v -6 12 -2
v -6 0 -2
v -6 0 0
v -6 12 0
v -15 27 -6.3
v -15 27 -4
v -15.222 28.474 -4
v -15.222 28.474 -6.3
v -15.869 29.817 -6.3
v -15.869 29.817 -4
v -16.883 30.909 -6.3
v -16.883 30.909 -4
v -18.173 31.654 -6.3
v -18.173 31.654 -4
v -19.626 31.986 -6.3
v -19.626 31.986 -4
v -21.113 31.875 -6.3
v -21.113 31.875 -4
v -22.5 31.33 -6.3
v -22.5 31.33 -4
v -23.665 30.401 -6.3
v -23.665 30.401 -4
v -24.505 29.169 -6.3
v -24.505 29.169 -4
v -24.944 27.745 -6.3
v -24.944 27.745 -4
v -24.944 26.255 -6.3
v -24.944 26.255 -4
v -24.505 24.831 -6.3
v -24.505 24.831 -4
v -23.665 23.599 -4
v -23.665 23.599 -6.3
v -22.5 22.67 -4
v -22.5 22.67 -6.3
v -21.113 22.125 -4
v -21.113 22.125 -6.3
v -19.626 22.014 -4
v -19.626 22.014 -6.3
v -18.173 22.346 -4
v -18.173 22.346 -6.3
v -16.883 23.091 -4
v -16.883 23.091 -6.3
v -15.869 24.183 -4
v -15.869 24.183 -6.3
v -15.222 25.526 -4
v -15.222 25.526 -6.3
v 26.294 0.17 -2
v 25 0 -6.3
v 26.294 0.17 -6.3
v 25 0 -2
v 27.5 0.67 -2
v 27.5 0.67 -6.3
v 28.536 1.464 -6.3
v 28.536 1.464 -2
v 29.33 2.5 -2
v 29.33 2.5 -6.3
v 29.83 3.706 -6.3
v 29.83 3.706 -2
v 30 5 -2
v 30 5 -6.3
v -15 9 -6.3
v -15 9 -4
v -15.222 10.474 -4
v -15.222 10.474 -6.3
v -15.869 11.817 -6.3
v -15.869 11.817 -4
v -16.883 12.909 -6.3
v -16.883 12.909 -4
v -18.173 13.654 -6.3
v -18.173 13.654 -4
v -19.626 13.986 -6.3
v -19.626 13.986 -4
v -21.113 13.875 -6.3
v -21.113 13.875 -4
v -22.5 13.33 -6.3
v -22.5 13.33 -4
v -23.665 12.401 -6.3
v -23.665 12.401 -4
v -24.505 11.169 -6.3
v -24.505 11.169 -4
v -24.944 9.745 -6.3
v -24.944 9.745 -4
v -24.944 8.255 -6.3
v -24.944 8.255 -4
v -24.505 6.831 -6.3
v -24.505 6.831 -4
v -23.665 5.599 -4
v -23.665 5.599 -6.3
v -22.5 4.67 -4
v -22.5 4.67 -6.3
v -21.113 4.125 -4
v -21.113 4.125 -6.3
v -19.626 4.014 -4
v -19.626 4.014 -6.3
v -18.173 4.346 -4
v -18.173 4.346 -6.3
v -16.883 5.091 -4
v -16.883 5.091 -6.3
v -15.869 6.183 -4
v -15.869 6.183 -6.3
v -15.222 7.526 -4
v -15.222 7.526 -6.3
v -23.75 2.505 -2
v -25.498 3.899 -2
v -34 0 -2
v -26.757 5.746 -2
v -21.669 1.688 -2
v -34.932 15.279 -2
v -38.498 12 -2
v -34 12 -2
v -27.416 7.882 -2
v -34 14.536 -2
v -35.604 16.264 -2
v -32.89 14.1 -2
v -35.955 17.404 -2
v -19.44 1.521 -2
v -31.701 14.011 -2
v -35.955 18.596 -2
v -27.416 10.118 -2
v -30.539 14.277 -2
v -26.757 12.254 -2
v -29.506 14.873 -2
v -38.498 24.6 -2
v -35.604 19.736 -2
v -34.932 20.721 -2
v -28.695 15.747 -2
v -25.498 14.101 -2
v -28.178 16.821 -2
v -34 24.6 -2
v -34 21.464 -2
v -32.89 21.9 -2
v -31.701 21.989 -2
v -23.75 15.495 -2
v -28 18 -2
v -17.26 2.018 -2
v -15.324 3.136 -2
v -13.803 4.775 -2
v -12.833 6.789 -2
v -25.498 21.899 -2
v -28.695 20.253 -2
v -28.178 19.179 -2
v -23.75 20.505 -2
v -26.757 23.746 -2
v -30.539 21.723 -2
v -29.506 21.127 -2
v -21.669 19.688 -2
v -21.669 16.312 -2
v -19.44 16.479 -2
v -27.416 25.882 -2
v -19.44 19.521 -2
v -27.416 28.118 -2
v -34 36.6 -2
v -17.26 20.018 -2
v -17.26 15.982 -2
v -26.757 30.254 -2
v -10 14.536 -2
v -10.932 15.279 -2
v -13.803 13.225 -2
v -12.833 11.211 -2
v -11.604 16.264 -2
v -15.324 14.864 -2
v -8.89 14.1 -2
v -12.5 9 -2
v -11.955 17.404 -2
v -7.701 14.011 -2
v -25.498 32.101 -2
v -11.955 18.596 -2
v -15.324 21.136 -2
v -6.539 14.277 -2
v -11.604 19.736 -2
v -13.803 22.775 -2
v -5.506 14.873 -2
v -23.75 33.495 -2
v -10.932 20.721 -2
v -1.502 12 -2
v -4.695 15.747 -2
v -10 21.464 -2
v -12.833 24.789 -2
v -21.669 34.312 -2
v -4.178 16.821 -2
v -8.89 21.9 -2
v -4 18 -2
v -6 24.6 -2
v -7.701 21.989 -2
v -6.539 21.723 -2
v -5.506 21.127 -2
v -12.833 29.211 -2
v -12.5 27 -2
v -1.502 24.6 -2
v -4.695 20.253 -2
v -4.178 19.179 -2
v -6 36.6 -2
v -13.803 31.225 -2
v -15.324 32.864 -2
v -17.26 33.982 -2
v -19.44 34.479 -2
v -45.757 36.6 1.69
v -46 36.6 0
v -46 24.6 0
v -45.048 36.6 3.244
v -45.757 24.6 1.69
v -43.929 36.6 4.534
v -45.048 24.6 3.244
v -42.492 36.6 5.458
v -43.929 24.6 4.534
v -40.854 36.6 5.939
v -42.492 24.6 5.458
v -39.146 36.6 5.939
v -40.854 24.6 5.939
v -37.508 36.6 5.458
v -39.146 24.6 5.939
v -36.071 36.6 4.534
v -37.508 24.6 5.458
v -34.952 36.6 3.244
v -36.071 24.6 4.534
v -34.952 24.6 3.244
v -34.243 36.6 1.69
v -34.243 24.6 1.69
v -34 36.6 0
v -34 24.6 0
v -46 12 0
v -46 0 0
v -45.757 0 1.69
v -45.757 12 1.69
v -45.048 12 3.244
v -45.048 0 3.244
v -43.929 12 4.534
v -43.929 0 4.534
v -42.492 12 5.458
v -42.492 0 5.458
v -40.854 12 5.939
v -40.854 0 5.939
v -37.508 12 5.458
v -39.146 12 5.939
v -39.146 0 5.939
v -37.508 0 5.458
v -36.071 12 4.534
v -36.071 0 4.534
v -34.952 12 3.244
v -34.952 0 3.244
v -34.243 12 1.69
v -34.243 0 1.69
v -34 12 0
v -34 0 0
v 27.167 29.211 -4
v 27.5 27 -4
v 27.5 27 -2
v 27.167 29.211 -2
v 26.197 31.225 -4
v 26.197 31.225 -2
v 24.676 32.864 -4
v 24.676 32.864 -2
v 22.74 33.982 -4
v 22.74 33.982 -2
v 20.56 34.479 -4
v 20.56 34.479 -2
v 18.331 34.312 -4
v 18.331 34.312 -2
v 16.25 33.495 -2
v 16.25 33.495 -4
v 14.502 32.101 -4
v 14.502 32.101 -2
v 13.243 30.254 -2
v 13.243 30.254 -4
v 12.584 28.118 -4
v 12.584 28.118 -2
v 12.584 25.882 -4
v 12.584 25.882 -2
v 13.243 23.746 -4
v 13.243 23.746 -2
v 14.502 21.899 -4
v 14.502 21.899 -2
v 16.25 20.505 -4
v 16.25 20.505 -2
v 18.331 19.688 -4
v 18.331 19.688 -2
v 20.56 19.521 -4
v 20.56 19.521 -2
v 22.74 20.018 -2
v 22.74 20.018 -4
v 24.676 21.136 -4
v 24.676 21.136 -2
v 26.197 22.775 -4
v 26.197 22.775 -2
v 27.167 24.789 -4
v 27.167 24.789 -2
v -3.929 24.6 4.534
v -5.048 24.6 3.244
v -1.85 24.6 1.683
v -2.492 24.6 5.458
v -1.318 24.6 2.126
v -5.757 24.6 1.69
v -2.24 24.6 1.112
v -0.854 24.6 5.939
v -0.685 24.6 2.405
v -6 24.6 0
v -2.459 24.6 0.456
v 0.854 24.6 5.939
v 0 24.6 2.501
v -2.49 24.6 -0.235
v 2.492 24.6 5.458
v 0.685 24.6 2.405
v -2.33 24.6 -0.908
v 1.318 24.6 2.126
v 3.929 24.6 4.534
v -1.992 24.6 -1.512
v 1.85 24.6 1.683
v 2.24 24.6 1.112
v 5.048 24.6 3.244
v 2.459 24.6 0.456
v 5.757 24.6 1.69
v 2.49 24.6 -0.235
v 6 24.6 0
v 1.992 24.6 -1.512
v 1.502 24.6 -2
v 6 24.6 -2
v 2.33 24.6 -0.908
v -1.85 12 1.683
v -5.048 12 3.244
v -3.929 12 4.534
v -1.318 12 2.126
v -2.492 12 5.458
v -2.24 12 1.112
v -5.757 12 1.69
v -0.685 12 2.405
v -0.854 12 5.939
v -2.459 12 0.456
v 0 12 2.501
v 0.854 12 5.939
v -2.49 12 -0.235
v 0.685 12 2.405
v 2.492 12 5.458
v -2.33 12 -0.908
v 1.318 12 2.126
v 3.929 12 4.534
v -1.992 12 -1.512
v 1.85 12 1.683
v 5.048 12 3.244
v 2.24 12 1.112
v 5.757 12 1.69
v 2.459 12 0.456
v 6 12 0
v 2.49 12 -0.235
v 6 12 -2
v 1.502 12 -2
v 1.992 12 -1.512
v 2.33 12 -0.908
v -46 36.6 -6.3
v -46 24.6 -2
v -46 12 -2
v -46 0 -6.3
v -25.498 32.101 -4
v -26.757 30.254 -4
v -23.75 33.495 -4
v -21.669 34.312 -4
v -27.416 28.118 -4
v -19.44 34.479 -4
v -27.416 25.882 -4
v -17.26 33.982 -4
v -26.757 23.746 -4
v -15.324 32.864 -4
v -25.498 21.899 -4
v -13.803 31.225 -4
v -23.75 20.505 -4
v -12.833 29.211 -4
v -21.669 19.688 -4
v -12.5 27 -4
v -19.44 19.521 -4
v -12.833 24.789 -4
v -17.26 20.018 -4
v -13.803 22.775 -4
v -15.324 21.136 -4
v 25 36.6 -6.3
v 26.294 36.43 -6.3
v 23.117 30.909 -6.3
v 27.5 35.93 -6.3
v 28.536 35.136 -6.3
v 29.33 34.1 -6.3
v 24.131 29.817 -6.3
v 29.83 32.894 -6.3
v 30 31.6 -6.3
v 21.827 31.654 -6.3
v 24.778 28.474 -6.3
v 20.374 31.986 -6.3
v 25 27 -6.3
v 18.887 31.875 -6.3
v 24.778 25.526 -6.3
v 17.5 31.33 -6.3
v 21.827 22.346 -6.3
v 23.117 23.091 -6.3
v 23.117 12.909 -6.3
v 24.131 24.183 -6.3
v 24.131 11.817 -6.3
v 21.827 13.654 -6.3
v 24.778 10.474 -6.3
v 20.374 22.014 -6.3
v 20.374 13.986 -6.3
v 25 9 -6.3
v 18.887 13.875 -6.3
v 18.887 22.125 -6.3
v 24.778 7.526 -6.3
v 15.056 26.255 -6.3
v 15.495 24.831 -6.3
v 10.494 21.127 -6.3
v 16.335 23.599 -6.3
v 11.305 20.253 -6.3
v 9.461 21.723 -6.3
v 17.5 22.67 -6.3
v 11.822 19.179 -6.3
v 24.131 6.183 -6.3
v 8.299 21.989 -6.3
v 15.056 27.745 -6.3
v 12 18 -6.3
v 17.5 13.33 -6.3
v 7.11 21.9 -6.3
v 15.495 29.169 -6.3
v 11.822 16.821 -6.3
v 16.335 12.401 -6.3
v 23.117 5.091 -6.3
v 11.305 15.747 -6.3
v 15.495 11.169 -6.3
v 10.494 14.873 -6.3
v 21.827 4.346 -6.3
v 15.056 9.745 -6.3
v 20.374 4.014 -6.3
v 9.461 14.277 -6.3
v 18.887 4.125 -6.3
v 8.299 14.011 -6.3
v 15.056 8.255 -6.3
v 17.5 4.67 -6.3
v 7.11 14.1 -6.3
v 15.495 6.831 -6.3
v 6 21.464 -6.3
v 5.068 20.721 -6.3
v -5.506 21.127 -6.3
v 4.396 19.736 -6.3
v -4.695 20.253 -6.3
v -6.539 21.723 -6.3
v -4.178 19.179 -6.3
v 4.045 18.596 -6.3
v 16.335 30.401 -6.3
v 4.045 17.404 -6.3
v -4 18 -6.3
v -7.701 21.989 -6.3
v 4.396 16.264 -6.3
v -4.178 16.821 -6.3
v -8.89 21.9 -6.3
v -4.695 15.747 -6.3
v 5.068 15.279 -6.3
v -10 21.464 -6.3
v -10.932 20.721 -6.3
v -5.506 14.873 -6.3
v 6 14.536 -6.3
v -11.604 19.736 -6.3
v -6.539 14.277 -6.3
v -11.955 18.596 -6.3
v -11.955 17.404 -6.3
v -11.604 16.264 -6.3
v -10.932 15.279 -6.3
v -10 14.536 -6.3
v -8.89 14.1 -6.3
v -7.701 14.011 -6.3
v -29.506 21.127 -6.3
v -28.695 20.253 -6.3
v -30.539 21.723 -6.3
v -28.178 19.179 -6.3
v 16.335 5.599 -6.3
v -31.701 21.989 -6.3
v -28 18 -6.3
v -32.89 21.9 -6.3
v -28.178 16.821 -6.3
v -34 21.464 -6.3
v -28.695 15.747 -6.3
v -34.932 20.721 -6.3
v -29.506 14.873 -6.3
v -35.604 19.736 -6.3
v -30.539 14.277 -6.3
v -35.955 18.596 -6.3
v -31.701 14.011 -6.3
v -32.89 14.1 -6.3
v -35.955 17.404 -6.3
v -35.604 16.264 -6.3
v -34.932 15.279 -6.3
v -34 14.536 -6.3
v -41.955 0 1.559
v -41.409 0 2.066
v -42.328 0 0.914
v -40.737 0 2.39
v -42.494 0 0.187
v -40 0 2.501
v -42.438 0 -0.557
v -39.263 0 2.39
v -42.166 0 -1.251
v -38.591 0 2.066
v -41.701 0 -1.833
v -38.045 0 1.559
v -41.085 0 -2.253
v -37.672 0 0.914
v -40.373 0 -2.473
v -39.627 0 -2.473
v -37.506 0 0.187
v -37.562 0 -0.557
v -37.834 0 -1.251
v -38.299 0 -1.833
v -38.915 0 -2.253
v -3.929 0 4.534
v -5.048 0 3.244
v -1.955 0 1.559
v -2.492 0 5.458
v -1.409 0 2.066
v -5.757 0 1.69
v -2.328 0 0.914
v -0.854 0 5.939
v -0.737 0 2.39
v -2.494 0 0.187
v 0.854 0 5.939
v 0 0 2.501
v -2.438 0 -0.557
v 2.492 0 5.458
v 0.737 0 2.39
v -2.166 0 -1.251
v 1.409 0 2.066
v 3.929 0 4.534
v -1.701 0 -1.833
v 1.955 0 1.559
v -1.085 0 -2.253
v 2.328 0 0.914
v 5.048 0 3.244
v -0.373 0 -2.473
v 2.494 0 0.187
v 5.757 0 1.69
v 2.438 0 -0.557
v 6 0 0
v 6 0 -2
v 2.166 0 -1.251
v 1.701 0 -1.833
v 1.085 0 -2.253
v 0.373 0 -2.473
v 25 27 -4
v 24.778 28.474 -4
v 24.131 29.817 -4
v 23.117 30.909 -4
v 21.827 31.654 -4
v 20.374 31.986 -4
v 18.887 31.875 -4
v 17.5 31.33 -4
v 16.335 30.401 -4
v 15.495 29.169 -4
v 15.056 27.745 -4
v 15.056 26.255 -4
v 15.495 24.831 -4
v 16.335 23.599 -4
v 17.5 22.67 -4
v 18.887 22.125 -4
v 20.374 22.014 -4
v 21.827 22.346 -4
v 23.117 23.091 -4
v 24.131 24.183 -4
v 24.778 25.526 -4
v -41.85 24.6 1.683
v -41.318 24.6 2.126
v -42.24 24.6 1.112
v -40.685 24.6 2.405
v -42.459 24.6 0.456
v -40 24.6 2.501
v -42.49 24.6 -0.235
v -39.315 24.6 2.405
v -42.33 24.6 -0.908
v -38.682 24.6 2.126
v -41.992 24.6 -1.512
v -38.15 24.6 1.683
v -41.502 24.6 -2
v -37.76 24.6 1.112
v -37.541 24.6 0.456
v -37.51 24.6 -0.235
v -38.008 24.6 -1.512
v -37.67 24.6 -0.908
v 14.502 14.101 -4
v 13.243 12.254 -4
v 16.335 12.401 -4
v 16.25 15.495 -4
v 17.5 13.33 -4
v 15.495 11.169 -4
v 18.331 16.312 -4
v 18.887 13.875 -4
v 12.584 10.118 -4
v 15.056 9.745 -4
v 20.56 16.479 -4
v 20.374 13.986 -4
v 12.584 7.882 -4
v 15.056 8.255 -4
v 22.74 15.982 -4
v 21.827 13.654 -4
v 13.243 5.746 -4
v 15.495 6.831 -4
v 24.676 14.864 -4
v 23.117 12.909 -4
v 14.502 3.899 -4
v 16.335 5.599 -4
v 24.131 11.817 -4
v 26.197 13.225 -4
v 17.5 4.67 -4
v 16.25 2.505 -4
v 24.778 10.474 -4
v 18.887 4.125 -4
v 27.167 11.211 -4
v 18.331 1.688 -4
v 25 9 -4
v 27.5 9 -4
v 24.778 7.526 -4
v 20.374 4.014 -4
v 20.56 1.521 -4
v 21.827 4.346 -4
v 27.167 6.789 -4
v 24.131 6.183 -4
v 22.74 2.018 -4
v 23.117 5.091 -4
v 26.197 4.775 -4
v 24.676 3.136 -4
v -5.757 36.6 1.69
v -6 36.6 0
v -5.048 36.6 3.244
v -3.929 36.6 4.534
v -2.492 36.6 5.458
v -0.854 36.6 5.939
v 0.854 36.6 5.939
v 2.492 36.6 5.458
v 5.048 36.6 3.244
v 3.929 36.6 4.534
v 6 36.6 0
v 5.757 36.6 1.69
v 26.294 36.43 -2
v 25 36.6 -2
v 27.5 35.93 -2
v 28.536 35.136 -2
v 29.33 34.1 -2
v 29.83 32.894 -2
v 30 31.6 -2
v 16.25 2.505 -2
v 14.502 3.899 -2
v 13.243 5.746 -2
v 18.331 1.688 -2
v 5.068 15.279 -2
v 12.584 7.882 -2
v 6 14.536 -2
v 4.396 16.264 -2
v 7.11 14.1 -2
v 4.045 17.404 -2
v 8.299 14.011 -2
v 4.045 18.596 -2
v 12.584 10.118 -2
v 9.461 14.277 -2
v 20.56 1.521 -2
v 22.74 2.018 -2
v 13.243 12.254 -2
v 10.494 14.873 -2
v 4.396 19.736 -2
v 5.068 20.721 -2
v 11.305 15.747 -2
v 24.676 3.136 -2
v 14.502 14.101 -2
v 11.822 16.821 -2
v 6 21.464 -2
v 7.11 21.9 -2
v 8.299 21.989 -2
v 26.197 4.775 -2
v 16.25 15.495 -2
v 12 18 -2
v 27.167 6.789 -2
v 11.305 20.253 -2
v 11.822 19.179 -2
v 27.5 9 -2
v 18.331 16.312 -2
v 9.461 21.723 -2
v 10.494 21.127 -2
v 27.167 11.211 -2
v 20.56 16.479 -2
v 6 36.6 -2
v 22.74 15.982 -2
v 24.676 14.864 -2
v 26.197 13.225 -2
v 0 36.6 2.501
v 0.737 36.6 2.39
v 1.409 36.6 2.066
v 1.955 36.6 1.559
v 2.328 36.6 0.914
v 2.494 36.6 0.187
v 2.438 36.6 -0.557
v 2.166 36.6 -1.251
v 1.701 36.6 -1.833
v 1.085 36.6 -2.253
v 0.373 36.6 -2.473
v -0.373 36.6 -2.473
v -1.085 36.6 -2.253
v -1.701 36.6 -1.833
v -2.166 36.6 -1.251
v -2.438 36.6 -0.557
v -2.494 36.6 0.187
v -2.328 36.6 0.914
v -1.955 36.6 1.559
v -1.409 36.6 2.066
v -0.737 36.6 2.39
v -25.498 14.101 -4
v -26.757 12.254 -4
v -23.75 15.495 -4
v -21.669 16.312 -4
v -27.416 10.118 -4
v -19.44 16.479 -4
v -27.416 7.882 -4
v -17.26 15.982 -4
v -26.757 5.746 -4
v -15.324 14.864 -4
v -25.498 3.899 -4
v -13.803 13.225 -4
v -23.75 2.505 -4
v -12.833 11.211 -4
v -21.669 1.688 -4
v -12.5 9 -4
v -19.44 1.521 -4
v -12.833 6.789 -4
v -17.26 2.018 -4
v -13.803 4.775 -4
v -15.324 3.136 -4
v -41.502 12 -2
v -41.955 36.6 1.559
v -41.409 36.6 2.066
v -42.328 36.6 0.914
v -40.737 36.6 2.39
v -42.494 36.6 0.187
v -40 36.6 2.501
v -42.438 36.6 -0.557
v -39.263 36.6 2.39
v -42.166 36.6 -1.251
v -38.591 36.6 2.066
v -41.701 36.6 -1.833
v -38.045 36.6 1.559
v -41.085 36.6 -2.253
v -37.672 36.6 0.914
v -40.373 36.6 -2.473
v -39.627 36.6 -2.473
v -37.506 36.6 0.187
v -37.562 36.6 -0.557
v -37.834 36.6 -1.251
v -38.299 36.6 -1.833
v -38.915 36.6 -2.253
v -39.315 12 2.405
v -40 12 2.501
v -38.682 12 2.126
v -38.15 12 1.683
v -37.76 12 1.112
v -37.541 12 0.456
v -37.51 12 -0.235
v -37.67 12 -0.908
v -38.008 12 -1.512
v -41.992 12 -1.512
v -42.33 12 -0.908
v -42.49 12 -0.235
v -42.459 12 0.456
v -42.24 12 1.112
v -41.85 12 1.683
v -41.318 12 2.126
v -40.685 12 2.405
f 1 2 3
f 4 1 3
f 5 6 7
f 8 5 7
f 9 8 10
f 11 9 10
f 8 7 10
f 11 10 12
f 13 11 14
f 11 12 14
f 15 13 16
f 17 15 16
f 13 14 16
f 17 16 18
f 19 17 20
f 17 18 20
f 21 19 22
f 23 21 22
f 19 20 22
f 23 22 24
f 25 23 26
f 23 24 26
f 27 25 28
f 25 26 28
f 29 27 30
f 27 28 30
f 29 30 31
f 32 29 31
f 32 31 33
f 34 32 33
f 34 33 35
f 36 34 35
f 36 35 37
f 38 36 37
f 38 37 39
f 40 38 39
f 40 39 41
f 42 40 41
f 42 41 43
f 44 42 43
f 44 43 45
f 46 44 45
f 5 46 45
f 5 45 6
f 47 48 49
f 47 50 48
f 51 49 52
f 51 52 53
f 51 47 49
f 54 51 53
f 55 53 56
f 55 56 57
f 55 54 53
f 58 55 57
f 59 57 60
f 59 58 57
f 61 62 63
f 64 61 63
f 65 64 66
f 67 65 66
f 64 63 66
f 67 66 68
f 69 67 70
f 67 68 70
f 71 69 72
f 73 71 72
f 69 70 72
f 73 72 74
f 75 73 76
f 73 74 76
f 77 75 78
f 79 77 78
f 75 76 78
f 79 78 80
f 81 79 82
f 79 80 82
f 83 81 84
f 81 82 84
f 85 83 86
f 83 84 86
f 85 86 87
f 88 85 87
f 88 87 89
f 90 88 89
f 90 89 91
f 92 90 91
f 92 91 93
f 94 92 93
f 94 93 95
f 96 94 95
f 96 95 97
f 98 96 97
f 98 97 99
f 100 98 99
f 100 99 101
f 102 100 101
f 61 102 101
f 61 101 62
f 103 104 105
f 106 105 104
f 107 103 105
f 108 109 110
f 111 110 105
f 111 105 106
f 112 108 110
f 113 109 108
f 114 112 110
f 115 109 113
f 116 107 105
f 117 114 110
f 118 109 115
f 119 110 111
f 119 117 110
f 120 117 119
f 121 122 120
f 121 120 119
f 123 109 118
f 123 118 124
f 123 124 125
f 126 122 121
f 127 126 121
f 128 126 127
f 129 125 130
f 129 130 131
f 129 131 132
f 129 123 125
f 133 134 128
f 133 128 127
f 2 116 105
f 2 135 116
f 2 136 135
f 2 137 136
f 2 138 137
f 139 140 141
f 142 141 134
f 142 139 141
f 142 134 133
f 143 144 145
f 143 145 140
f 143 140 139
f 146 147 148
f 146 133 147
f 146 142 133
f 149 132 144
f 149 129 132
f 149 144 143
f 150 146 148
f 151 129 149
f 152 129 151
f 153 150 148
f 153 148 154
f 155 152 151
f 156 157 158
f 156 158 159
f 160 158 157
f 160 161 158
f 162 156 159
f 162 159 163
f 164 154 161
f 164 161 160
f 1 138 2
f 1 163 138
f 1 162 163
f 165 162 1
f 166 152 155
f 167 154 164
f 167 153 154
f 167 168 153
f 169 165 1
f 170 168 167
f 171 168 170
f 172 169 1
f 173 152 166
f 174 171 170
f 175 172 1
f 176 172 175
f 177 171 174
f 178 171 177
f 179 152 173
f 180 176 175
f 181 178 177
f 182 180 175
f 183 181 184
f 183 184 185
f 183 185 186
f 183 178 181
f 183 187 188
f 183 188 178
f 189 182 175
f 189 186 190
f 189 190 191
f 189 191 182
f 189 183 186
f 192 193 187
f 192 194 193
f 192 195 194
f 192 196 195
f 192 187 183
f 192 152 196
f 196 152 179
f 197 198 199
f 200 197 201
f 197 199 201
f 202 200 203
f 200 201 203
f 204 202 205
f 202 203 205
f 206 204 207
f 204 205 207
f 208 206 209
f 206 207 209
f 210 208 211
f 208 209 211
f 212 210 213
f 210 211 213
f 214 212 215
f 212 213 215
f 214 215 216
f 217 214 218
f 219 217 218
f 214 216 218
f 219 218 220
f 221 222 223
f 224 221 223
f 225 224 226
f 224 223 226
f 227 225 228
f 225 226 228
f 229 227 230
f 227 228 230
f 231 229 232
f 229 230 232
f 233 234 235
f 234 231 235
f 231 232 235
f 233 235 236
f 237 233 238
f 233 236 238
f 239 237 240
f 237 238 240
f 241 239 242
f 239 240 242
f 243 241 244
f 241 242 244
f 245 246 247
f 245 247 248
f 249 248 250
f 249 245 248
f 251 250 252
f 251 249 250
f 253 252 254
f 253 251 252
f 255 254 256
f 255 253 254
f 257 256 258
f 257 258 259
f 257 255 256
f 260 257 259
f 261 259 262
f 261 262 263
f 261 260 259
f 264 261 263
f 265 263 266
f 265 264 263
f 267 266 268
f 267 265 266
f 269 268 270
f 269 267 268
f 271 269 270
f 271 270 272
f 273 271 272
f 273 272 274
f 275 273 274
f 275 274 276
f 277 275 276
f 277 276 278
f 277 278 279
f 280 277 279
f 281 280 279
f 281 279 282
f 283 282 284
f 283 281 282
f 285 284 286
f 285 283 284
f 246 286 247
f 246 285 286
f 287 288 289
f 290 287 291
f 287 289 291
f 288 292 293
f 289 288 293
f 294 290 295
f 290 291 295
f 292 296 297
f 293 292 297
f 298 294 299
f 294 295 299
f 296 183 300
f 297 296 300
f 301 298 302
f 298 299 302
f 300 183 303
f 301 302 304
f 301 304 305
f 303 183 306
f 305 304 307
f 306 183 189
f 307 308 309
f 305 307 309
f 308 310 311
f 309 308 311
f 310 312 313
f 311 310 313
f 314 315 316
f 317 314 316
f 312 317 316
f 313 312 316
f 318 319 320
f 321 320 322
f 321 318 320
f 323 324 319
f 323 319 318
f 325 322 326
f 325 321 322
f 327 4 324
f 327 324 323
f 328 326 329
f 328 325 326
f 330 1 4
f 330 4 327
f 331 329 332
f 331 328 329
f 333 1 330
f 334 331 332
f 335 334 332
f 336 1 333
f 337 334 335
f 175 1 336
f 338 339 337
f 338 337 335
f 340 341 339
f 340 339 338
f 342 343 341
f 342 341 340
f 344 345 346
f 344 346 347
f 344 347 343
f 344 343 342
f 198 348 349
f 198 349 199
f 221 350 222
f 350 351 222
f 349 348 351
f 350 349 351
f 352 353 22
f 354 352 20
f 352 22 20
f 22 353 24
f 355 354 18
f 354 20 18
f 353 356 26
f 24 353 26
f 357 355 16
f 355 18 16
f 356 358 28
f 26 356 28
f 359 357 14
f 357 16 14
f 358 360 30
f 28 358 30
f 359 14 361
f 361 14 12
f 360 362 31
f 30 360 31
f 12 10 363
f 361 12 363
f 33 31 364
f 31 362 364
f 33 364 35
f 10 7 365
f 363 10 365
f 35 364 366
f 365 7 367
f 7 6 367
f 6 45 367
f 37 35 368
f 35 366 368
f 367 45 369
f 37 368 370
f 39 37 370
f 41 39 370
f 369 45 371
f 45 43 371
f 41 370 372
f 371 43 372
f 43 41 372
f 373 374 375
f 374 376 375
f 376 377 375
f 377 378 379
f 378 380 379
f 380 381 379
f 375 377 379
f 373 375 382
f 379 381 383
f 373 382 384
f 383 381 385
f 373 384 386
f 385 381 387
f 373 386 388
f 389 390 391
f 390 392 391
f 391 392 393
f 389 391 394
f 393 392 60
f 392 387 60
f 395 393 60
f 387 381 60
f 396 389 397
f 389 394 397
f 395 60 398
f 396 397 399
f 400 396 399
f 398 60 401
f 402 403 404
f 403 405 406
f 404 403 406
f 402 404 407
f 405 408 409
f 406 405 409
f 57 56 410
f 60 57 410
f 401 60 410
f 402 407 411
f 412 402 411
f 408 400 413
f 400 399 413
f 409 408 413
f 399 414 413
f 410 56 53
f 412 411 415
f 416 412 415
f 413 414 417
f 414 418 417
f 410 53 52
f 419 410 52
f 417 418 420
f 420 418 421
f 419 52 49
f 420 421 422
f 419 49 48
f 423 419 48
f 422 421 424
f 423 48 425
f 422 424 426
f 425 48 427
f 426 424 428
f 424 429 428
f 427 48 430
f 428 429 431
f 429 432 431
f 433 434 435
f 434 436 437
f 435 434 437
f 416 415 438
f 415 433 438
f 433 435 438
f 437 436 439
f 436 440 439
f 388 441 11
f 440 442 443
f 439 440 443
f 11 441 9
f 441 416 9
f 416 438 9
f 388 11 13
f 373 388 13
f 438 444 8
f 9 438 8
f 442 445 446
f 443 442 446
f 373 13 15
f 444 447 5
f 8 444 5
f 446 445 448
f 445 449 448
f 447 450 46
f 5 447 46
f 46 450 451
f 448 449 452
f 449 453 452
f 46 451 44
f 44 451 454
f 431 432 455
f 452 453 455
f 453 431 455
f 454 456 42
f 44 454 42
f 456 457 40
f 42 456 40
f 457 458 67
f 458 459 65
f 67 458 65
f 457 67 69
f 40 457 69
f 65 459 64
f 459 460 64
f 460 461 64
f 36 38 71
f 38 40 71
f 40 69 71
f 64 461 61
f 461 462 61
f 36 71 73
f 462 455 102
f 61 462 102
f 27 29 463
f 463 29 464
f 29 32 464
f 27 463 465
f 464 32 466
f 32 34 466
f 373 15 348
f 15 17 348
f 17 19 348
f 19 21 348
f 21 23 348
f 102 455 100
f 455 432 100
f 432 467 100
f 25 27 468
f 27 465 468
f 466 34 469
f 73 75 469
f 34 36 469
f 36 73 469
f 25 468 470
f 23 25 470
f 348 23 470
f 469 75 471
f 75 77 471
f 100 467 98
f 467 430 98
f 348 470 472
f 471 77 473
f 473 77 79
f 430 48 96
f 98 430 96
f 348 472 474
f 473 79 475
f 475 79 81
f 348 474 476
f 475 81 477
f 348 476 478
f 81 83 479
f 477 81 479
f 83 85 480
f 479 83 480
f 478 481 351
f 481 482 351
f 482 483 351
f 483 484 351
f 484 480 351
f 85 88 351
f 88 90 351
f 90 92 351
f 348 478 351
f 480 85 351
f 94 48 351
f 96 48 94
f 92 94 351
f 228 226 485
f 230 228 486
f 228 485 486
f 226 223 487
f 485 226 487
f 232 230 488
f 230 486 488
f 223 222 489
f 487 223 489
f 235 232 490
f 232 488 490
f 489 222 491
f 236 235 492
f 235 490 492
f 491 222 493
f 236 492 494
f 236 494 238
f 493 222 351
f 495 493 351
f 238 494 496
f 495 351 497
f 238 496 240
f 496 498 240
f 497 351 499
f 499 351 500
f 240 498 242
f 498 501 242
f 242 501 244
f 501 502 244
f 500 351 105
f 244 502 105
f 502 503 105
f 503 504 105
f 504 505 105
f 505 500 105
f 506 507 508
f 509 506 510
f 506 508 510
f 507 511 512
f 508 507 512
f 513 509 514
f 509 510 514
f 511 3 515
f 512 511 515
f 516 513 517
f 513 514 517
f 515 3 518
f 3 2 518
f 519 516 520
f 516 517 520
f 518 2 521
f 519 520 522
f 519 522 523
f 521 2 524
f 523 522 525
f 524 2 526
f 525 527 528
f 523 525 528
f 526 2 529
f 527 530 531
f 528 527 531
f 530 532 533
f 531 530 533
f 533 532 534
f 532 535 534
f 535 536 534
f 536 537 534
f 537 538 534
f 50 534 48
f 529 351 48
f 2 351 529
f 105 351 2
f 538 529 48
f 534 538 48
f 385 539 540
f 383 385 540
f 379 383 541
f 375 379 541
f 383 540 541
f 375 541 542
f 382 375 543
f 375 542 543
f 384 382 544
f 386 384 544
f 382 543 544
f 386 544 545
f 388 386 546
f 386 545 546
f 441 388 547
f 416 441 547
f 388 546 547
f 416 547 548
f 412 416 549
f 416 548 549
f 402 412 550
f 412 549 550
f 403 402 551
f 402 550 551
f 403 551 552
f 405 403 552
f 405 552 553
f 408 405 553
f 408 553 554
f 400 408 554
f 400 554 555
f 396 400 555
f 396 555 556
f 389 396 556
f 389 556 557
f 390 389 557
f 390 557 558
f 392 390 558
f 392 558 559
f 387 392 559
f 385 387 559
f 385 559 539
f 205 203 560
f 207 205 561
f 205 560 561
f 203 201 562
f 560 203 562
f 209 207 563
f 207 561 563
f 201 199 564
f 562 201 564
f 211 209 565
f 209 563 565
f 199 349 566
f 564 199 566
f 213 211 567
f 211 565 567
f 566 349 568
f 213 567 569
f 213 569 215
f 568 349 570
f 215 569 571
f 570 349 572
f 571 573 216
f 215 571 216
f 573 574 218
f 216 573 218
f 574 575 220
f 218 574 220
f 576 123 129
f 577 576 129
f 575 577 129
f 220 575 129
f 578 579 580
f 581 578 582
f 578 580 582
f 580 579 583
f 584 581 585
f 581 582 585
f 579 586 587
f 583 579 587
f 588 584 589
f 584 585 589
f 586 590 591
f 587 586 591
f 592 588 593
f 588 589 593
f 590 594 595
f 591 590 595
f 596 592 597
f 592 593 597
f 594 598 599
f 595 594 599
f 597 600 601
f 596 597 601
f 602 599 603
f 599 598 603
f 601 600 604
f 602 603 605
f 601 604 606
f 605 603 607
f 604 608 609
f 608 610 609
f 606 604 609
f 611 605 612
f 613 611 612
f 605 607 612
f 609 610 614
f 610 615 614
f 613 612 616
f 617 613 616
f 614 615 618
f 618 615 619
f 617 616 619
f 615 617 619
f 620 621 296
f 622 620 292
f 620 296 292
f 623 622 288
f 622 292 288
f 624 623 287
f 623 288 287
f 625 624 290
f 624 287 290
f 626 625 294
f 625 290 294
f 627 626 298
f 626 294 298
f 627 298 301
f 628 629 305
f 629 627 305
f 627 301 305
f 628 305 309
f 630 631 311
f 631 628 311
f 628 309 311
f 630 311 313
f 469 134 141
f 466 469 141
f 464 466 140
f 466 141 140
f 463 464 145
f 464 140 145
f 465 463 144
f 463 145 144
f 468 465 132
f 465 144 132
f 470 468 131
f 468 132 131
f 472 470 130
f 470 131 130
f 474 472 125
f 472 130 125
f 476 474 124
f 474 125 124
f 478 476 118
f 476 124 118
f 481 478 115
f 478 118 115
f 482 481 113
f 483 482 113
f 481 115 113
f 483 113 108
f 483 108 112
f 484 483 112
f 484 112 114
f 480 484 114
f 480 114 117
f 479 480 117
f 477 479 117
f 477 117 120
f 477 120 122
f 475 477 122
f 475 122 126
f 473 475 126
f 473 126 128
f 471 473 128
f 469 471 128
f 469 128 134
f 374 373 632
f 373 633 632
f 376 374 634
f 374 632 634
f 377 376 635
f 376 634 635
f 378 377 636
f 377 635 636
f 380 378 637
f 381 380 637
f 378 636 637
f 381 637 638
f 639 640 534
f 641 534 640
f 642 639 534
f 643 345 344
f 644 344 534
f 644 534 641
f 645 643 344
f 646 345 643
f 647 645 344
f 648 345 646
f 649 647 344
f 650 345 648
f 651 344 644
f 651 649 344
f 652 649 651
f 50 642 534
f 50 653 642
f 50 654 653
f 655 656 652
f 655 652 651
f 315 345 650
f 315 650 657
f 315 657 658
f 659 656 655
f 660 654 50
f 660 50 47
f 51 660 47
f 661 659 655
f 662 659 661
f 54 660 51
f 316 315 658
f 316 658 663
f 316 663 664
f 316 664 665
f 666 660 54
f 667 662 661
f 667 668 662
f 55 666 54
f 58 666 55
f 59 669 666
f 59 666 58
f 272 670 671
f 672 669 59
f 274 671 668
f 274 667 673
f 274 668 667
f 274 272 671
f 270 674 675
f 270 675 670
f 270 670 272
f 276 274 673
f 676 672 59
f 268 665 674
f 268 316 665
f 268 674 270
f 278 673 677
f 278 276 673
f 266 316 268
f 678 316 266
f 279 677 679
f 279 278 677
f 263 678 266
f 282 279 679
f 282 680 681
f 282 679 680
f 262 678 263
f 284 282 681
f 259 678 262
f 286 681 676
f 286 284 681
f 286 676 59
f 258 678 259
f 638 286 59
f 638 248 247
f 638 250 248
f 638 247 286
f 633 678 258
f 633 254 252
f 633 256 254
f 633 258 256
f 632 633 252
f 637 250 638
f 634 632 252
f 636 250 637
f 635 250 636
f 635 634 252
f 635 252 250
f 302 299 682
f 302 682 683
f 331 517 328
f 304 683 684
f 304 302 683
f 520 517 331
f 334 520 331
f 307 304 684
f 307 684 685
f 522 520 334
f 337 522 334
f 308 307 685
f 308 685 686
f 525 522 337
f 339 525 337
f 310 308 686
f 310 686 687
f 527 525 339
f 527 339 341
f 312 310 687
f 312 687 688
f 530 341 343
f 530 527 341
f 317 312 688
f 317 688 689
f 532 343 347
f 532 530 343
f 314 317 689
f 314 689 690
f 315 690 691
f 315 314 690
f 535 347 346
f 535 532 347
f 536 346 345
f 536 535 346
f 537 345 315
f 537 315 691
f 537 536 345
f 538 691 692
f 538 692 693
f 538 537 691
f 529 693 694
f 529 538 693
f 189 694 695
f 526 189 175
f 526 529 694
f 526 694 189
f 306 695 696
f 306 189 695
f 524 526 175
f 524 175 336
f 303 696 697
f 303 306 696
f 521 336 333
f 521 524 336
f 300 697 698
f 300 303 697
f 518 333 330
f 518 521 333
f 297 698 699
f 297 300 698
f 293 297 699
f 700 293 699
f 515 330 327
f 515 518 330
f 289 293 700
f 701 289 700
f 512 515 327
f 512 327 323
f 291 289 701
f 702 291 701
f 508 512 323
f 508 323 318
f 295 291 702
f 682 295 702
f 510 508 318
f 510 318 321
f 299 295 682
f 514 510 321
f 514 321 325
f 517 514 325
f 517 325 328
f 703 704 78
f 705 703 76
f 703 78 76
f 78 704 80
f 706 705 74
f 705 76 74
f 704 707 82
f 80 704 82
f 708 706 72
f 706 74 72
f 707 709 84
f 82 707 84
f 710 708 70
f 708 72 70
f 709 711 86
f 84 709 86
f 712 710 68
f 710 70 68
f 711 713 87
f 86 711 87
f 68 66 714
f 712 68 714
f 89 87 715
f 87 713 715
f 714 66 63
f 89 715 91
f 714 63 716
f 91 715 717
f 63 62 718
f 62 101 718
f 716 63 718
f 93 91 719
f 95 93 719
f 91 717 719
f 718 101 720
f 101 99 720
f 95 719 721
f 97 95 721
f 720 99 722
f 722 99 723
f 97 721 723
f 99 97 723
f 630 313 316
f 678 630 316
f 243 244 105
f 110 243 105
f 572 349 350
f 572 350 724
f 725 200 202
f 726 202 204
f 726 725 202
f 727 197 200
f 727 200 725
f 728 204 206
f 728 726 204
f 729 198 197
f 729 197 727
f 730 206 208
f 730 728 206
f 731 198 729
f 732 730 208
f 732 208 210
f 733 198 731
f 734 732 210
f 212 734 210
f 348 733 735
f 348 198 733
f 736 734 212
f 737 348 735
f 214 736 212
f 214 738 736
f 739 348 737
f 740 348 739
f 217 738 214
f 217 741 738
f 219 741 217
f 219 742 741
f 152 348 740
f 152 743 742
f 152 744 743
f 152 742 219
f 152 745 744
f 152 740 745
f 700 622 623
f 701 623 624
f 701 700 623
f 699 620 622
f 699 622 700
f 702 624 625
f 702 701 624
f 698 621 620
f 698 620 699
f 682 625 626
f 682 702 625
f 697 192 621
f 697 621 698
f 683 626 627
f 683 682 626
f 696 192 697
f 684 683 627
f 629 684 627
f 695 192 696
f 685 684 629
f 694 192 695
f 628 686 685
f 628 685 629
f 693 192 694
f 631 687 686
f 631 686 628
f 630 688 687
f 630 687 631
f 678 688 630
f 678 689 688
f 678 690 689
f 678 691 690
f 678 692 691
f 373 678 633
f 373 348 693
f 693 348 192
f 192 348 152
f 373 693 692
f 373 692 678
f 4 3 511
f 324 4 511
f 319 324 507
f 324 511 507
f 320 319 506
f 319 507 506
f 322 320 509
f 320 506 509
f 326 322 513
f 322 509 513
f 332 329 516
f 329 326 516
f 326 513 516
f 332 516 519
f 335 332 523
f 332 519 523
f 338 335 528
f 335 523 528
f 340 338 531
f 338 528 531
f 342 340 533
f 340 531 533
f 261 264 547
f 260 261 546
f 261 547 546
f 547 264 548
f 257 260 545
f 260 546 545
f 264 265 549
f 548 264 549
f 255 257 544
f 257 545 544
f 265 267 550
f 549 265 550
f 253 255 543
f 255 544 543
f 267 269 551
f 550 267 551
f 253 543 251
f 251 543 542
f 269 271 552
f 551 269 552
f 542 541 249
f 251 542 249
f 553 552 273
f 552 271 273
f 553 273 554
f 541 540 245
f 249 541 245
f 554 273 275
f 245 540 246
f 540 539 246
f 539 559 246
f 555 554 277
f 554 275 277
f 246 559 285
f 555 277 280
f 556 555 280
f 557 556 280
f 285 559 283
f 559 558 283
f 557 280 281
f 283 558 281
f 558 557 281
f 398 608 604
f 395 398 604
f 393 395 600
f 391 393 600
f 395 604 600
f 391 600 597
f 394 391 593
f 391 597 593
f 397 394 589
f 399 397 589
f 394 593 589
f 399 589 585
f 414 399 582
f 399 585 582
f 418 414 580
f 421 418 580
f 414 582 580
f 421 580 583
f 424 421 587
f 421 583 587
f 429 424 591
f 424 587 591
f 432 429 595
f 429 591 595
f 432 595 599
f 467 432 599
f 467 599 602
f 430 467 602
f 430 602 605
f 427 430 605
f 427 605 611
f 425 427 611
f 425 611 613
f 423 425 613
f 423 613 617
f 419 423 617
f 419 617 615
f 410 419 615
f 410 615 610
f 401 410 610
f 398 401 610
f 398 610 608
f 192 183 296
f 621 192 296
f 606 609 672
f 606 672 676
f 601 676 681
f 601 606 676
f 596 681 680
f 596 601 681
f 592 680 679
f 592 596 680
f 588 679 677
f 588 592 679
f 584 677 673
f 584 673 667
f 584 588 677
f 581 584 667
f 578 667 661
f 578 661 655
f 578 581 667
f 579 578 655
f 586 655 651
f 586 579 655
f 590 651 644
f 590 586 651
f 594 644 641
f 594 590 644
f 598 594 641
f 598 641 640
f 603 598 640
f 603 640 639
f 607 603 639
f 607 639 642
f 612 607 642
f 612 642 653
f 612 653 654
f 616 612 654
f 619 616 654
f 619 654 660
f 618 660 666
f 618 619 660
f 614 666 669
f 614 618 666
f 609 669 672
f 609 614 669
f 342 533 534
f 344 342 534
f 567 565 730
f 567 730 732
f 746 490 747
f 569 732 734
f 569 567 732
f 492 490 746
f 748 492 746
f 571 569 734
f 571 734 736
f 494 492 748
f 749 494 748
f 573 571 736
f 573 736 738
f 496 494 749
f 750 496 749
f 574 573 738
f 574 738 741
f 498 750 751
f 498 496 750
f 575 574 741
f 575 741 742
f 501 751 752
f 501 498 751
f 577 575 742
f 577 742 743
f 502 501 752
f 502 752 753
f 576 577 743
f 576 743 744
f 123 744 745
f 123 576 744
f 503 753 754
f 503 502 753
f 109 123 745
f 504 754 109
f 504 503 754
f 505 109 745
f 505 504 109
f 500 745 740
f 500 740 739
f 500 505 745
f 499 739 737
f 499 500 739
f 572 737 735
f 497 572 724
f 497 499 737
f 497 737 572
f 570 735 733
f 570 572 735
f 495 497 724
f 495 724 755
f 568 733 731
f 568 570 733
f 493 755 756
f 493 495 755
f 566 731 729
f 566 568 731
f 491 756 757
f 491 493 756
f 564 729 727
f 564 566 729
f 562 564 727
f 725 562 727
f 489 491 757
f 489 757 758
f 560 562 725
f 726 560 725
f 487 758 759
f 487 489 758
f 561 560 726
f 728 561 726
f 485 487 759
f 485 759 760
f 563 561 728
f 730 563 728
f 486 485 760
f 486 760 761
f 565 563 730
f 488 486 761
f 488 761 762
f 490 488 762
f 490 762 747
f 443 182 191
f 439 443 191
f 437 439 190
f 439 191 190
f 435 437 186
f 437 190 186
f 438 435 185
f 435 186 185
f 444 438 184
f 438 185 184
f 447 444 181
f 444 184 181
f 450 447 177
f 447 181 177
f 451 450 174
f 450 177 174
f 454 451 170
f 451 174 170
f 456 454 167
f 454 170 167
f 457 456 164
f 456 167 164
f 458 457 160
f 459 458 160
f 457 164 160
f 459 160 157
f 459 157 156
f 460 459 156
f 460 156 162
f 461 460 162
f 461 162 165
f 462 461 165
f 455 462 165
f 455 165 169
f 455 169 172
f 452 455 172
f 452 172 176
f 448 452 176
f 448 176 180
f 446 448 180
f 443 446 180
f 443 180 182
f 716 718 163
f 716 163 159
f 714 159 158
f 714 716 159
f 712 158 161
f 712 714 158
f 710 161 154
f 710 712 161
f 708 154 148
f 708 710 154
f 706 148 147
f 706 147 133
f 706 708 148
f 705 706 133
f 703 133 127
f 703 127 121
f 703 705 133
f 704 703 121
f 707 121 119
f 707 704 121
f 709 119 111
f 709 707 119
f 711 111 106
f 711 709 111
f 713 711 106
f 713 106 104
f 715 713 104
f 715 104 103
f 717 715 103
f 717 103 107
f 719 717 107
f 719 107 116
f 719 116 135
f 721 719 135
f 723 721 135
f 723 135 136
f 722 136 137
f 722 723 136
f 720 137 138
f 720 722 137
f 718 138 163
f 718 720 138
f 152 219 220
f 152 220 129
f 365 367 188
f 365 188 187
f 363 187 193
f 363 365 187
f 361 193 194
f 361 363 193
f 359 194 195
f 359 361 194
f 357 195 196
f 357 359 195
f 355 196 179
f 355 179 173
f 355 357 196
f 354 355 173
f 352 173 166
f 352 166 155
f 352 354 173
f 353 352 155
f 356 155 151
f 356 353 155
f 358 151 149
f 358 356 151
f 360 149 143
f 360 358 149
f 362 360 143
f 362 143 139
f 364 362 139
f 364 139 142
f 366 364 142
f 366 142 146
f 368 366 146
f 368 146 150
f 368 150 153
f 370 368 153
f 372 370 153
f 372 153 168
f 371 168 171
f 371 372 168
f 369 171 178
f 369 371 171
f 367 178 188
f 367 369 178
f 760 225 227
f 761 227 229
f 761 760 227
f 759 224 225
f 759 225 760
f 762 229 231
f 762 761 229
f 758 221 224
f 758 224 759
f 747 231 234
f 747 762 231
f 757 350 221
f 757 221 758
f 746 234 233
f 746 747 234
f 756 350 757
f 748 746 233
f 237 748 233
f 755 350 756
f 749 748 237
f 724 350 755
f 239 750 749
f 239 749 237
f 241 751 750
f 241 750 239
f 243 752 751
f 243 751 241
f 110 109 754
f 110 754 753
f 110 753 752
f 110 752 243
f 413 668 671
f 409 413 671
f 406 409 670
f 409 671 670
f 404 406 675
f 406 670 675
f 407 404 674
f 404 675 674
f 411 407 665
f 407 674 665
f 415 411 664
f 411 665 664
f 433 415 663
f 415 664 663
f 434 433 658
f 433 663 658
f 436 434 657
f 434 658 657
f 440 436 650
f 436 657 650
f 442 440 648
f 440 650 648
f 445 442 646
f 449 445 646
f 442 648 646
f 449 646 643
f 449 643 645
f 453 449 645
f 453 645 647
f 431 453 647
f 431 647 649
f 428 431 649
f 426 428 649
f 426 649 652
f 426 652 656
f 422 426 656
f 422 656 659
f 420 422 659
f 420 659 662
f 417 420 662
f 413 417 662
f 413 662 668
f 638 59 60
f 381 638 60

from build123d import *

# Parameters (mm, degrees)
SKETCH1_R             = 6
SKETCH1_R_2           = 2.501
BOSS_EXTRUDE1_DEPTH   = 36.6
BOSS_EXTRUDE1_2_DEPTH = 36.6
BOSS_EXTRUDE2_DEPTH   = 36.6
SKETCH2_R             = 5
CUT_EXTRUDE1_DEPTH    = 60.120639374
SKETCH6_W             = 28
SKETCH6_H             = 36.6
SKETCH6_R             = 7.5
SKETCH6_W_2           = 24
BOSS_EXTRUDE3_DEPTH   = 2
FILLET2_R             = 5
SKETCH7_R             = 4
CUT_EXTRUDE2_DEPTH    = 60.325879682
SKETCH8_W             = 12
SKETCH8_H             = 12.6
CUT_EXTRUDE3_DEPTH    = 60.325879682


with BuildPart() as part:
    # Sketch1 → Boss-Extrude1 (new body)
    with BuildSketch(Plane(origin=(0, 0, 0), x_dir=(1, 0, 0), z_dir=(0, 1, 0))):
        with Locations(Location((-40, 0, 0), (0, 0, 270))):
            Circle(SKETCH1_R)
        with Locations(Location((-40, 0, 0), (0, 0, 270))):
            Circle(SKETCH1_R_2, mode=Mode.SUBTRACT)
    extrude(amount=BOSS_EXTRUDE1_DEPTH)



with BuildPart() as body_2:
    # Sketch1 → Boss-Extrude1 2 (new body)
    with BuildSketch(Plane(origin=(0, 0, 0), x_dir=(1, 0, 0), z_dir=(0, 1, 0))):
        with Locations(Location((0, 0, 0), (0, 0, 270))):
            Circle(SKETCH1_R)
        with Locations(Location((0, 0, 0), (0, 0, 270))):
            Circle(SKETCH1_R_2, mode=Mode.SUBTRACT)
    extrude(amount=BOSS_EXTRUDE1_2_DEPTH)


with BuildPart() as part_1:
    add(part.part)

    add(body_2.part)  # Boss-Extrude2 merges body 2
    # Sketch3 → Boss-Extrude2 (add)
    with BuildSketch(Plane(origin=(0, 0, 0), x_dir=(1, 0, 0), z_dir=(0, 1, 0))):
        with BuildLine():
            Line((-34, 0), (-34, 4))
            Line((-34, 4), (-6, 4))
            Line((-6, 4), (-6, 0))
            ThreePointArc((-6, 0), (0, 6), (6, 0))
            Line((6, 0), (6, 4))
            Line((6, 4), (30, 4))
            Line((30, 4), (30, 6.3))
            Line((30, 6.3), (6, 6.3))
            Line((6, 6.3), (-46, 6.3))
            Line((-46, 6.3), (-46, 0))
            ThreePointArc((-46, 0), (-40, 6), (-34, 0))
        make_face()
    extrude(amount=BOSS_EXTRUDE2_DEPTH)

    # Sketch2 → Cut-Extrude1 (cut, through all)
    with BuildSketch(Plane.XY):
        with Locations((-20, 27)):
            Circle(SKETCH2_R)
        with Locations((-20, 9)):
            Circle(SKETCH2_R)
        with Locations((20, 27)):
            Circle(SKETCH2_R)
        with Locations((20, 9)):
            Circle(SKETCH2_R)
    extrude(amount=-CUT_EXTRUDE1_DEPTH, mode=Mode.SUBTRACT)

    # Sketch6 → Boss-Extrude3 (add)
    # profile 1 of 2: a face of its own
    with BuildSketch(Plane.XY.offset(-4)):
        with Locations((-20, 18.3)):
            Rectangle(SKETCH6_W, SKETCH6_H)
        with Locations((-20, 27)):
            Circle(SKETCH6_R, mode=Mode.SUBTRACT)
        with Locations((-20, 9)):
            Circle(SKETCH6_R, mode=Mode.SUBTRACT)
    # profile 2 of 2: a face of its own
    with BuildSketch(Plane.XY.offset(-4)):
        with Locations((18, 18.3)):
            Rectangle(SKETCH6_W_2, SKETCH6_H)
        with Locations((20, 27)):
            Circle(SKETCH6_R, mode=Mode.SUBTRACT)
        with Locations((20, 9)):
            Circle(SKETCH6_R, mode=Mode.SUBTRACT)
    extrude(amount=BOSS_EXTRUDE3_DEPTH)

    # Fillet2
    fillet2_edges = [part_1.edges().sort_by_distance(p)[0] for p in [
        (30, 36.6, -4.15),
        (30, 0, -4.15),
    ]]
    fillet(fillet2_edges, radius=FILLET2_R)

    # Sketch7 → Cut-Extrude2 (cut, through all)
    with BuildSketch(Plane.XY.offset(-2)):
        with Locations((-32, 18)):
            Circle(SKETCH7_R)
        with Locations((-8, 18)):
            Circle(SKETCH7_R)
        with Locations((8, 18)):
            Circle(SKETCH7_R)
    extrude(amount=-CUT_EXTRUDE2_DEPTH, mode=Mode.SUBTRACT)

    # Sketch8 → Cut-Extrude3 (cut, through all)
    with BuildSketch(Plane.XY.offset(-2)):
        with Locations((0, 18.3)):
            Rectangle(SKETCH8_W, SKETCH8_H)
        with Locations((-40, 18.3)):
            Rectangle(SKETCH8_W, SKETCH8_H)
    extrude(amount=CUT_EXTRUDE3_DEPTH, mode=Mode.SUBTRACT)


solid = part_1.part
